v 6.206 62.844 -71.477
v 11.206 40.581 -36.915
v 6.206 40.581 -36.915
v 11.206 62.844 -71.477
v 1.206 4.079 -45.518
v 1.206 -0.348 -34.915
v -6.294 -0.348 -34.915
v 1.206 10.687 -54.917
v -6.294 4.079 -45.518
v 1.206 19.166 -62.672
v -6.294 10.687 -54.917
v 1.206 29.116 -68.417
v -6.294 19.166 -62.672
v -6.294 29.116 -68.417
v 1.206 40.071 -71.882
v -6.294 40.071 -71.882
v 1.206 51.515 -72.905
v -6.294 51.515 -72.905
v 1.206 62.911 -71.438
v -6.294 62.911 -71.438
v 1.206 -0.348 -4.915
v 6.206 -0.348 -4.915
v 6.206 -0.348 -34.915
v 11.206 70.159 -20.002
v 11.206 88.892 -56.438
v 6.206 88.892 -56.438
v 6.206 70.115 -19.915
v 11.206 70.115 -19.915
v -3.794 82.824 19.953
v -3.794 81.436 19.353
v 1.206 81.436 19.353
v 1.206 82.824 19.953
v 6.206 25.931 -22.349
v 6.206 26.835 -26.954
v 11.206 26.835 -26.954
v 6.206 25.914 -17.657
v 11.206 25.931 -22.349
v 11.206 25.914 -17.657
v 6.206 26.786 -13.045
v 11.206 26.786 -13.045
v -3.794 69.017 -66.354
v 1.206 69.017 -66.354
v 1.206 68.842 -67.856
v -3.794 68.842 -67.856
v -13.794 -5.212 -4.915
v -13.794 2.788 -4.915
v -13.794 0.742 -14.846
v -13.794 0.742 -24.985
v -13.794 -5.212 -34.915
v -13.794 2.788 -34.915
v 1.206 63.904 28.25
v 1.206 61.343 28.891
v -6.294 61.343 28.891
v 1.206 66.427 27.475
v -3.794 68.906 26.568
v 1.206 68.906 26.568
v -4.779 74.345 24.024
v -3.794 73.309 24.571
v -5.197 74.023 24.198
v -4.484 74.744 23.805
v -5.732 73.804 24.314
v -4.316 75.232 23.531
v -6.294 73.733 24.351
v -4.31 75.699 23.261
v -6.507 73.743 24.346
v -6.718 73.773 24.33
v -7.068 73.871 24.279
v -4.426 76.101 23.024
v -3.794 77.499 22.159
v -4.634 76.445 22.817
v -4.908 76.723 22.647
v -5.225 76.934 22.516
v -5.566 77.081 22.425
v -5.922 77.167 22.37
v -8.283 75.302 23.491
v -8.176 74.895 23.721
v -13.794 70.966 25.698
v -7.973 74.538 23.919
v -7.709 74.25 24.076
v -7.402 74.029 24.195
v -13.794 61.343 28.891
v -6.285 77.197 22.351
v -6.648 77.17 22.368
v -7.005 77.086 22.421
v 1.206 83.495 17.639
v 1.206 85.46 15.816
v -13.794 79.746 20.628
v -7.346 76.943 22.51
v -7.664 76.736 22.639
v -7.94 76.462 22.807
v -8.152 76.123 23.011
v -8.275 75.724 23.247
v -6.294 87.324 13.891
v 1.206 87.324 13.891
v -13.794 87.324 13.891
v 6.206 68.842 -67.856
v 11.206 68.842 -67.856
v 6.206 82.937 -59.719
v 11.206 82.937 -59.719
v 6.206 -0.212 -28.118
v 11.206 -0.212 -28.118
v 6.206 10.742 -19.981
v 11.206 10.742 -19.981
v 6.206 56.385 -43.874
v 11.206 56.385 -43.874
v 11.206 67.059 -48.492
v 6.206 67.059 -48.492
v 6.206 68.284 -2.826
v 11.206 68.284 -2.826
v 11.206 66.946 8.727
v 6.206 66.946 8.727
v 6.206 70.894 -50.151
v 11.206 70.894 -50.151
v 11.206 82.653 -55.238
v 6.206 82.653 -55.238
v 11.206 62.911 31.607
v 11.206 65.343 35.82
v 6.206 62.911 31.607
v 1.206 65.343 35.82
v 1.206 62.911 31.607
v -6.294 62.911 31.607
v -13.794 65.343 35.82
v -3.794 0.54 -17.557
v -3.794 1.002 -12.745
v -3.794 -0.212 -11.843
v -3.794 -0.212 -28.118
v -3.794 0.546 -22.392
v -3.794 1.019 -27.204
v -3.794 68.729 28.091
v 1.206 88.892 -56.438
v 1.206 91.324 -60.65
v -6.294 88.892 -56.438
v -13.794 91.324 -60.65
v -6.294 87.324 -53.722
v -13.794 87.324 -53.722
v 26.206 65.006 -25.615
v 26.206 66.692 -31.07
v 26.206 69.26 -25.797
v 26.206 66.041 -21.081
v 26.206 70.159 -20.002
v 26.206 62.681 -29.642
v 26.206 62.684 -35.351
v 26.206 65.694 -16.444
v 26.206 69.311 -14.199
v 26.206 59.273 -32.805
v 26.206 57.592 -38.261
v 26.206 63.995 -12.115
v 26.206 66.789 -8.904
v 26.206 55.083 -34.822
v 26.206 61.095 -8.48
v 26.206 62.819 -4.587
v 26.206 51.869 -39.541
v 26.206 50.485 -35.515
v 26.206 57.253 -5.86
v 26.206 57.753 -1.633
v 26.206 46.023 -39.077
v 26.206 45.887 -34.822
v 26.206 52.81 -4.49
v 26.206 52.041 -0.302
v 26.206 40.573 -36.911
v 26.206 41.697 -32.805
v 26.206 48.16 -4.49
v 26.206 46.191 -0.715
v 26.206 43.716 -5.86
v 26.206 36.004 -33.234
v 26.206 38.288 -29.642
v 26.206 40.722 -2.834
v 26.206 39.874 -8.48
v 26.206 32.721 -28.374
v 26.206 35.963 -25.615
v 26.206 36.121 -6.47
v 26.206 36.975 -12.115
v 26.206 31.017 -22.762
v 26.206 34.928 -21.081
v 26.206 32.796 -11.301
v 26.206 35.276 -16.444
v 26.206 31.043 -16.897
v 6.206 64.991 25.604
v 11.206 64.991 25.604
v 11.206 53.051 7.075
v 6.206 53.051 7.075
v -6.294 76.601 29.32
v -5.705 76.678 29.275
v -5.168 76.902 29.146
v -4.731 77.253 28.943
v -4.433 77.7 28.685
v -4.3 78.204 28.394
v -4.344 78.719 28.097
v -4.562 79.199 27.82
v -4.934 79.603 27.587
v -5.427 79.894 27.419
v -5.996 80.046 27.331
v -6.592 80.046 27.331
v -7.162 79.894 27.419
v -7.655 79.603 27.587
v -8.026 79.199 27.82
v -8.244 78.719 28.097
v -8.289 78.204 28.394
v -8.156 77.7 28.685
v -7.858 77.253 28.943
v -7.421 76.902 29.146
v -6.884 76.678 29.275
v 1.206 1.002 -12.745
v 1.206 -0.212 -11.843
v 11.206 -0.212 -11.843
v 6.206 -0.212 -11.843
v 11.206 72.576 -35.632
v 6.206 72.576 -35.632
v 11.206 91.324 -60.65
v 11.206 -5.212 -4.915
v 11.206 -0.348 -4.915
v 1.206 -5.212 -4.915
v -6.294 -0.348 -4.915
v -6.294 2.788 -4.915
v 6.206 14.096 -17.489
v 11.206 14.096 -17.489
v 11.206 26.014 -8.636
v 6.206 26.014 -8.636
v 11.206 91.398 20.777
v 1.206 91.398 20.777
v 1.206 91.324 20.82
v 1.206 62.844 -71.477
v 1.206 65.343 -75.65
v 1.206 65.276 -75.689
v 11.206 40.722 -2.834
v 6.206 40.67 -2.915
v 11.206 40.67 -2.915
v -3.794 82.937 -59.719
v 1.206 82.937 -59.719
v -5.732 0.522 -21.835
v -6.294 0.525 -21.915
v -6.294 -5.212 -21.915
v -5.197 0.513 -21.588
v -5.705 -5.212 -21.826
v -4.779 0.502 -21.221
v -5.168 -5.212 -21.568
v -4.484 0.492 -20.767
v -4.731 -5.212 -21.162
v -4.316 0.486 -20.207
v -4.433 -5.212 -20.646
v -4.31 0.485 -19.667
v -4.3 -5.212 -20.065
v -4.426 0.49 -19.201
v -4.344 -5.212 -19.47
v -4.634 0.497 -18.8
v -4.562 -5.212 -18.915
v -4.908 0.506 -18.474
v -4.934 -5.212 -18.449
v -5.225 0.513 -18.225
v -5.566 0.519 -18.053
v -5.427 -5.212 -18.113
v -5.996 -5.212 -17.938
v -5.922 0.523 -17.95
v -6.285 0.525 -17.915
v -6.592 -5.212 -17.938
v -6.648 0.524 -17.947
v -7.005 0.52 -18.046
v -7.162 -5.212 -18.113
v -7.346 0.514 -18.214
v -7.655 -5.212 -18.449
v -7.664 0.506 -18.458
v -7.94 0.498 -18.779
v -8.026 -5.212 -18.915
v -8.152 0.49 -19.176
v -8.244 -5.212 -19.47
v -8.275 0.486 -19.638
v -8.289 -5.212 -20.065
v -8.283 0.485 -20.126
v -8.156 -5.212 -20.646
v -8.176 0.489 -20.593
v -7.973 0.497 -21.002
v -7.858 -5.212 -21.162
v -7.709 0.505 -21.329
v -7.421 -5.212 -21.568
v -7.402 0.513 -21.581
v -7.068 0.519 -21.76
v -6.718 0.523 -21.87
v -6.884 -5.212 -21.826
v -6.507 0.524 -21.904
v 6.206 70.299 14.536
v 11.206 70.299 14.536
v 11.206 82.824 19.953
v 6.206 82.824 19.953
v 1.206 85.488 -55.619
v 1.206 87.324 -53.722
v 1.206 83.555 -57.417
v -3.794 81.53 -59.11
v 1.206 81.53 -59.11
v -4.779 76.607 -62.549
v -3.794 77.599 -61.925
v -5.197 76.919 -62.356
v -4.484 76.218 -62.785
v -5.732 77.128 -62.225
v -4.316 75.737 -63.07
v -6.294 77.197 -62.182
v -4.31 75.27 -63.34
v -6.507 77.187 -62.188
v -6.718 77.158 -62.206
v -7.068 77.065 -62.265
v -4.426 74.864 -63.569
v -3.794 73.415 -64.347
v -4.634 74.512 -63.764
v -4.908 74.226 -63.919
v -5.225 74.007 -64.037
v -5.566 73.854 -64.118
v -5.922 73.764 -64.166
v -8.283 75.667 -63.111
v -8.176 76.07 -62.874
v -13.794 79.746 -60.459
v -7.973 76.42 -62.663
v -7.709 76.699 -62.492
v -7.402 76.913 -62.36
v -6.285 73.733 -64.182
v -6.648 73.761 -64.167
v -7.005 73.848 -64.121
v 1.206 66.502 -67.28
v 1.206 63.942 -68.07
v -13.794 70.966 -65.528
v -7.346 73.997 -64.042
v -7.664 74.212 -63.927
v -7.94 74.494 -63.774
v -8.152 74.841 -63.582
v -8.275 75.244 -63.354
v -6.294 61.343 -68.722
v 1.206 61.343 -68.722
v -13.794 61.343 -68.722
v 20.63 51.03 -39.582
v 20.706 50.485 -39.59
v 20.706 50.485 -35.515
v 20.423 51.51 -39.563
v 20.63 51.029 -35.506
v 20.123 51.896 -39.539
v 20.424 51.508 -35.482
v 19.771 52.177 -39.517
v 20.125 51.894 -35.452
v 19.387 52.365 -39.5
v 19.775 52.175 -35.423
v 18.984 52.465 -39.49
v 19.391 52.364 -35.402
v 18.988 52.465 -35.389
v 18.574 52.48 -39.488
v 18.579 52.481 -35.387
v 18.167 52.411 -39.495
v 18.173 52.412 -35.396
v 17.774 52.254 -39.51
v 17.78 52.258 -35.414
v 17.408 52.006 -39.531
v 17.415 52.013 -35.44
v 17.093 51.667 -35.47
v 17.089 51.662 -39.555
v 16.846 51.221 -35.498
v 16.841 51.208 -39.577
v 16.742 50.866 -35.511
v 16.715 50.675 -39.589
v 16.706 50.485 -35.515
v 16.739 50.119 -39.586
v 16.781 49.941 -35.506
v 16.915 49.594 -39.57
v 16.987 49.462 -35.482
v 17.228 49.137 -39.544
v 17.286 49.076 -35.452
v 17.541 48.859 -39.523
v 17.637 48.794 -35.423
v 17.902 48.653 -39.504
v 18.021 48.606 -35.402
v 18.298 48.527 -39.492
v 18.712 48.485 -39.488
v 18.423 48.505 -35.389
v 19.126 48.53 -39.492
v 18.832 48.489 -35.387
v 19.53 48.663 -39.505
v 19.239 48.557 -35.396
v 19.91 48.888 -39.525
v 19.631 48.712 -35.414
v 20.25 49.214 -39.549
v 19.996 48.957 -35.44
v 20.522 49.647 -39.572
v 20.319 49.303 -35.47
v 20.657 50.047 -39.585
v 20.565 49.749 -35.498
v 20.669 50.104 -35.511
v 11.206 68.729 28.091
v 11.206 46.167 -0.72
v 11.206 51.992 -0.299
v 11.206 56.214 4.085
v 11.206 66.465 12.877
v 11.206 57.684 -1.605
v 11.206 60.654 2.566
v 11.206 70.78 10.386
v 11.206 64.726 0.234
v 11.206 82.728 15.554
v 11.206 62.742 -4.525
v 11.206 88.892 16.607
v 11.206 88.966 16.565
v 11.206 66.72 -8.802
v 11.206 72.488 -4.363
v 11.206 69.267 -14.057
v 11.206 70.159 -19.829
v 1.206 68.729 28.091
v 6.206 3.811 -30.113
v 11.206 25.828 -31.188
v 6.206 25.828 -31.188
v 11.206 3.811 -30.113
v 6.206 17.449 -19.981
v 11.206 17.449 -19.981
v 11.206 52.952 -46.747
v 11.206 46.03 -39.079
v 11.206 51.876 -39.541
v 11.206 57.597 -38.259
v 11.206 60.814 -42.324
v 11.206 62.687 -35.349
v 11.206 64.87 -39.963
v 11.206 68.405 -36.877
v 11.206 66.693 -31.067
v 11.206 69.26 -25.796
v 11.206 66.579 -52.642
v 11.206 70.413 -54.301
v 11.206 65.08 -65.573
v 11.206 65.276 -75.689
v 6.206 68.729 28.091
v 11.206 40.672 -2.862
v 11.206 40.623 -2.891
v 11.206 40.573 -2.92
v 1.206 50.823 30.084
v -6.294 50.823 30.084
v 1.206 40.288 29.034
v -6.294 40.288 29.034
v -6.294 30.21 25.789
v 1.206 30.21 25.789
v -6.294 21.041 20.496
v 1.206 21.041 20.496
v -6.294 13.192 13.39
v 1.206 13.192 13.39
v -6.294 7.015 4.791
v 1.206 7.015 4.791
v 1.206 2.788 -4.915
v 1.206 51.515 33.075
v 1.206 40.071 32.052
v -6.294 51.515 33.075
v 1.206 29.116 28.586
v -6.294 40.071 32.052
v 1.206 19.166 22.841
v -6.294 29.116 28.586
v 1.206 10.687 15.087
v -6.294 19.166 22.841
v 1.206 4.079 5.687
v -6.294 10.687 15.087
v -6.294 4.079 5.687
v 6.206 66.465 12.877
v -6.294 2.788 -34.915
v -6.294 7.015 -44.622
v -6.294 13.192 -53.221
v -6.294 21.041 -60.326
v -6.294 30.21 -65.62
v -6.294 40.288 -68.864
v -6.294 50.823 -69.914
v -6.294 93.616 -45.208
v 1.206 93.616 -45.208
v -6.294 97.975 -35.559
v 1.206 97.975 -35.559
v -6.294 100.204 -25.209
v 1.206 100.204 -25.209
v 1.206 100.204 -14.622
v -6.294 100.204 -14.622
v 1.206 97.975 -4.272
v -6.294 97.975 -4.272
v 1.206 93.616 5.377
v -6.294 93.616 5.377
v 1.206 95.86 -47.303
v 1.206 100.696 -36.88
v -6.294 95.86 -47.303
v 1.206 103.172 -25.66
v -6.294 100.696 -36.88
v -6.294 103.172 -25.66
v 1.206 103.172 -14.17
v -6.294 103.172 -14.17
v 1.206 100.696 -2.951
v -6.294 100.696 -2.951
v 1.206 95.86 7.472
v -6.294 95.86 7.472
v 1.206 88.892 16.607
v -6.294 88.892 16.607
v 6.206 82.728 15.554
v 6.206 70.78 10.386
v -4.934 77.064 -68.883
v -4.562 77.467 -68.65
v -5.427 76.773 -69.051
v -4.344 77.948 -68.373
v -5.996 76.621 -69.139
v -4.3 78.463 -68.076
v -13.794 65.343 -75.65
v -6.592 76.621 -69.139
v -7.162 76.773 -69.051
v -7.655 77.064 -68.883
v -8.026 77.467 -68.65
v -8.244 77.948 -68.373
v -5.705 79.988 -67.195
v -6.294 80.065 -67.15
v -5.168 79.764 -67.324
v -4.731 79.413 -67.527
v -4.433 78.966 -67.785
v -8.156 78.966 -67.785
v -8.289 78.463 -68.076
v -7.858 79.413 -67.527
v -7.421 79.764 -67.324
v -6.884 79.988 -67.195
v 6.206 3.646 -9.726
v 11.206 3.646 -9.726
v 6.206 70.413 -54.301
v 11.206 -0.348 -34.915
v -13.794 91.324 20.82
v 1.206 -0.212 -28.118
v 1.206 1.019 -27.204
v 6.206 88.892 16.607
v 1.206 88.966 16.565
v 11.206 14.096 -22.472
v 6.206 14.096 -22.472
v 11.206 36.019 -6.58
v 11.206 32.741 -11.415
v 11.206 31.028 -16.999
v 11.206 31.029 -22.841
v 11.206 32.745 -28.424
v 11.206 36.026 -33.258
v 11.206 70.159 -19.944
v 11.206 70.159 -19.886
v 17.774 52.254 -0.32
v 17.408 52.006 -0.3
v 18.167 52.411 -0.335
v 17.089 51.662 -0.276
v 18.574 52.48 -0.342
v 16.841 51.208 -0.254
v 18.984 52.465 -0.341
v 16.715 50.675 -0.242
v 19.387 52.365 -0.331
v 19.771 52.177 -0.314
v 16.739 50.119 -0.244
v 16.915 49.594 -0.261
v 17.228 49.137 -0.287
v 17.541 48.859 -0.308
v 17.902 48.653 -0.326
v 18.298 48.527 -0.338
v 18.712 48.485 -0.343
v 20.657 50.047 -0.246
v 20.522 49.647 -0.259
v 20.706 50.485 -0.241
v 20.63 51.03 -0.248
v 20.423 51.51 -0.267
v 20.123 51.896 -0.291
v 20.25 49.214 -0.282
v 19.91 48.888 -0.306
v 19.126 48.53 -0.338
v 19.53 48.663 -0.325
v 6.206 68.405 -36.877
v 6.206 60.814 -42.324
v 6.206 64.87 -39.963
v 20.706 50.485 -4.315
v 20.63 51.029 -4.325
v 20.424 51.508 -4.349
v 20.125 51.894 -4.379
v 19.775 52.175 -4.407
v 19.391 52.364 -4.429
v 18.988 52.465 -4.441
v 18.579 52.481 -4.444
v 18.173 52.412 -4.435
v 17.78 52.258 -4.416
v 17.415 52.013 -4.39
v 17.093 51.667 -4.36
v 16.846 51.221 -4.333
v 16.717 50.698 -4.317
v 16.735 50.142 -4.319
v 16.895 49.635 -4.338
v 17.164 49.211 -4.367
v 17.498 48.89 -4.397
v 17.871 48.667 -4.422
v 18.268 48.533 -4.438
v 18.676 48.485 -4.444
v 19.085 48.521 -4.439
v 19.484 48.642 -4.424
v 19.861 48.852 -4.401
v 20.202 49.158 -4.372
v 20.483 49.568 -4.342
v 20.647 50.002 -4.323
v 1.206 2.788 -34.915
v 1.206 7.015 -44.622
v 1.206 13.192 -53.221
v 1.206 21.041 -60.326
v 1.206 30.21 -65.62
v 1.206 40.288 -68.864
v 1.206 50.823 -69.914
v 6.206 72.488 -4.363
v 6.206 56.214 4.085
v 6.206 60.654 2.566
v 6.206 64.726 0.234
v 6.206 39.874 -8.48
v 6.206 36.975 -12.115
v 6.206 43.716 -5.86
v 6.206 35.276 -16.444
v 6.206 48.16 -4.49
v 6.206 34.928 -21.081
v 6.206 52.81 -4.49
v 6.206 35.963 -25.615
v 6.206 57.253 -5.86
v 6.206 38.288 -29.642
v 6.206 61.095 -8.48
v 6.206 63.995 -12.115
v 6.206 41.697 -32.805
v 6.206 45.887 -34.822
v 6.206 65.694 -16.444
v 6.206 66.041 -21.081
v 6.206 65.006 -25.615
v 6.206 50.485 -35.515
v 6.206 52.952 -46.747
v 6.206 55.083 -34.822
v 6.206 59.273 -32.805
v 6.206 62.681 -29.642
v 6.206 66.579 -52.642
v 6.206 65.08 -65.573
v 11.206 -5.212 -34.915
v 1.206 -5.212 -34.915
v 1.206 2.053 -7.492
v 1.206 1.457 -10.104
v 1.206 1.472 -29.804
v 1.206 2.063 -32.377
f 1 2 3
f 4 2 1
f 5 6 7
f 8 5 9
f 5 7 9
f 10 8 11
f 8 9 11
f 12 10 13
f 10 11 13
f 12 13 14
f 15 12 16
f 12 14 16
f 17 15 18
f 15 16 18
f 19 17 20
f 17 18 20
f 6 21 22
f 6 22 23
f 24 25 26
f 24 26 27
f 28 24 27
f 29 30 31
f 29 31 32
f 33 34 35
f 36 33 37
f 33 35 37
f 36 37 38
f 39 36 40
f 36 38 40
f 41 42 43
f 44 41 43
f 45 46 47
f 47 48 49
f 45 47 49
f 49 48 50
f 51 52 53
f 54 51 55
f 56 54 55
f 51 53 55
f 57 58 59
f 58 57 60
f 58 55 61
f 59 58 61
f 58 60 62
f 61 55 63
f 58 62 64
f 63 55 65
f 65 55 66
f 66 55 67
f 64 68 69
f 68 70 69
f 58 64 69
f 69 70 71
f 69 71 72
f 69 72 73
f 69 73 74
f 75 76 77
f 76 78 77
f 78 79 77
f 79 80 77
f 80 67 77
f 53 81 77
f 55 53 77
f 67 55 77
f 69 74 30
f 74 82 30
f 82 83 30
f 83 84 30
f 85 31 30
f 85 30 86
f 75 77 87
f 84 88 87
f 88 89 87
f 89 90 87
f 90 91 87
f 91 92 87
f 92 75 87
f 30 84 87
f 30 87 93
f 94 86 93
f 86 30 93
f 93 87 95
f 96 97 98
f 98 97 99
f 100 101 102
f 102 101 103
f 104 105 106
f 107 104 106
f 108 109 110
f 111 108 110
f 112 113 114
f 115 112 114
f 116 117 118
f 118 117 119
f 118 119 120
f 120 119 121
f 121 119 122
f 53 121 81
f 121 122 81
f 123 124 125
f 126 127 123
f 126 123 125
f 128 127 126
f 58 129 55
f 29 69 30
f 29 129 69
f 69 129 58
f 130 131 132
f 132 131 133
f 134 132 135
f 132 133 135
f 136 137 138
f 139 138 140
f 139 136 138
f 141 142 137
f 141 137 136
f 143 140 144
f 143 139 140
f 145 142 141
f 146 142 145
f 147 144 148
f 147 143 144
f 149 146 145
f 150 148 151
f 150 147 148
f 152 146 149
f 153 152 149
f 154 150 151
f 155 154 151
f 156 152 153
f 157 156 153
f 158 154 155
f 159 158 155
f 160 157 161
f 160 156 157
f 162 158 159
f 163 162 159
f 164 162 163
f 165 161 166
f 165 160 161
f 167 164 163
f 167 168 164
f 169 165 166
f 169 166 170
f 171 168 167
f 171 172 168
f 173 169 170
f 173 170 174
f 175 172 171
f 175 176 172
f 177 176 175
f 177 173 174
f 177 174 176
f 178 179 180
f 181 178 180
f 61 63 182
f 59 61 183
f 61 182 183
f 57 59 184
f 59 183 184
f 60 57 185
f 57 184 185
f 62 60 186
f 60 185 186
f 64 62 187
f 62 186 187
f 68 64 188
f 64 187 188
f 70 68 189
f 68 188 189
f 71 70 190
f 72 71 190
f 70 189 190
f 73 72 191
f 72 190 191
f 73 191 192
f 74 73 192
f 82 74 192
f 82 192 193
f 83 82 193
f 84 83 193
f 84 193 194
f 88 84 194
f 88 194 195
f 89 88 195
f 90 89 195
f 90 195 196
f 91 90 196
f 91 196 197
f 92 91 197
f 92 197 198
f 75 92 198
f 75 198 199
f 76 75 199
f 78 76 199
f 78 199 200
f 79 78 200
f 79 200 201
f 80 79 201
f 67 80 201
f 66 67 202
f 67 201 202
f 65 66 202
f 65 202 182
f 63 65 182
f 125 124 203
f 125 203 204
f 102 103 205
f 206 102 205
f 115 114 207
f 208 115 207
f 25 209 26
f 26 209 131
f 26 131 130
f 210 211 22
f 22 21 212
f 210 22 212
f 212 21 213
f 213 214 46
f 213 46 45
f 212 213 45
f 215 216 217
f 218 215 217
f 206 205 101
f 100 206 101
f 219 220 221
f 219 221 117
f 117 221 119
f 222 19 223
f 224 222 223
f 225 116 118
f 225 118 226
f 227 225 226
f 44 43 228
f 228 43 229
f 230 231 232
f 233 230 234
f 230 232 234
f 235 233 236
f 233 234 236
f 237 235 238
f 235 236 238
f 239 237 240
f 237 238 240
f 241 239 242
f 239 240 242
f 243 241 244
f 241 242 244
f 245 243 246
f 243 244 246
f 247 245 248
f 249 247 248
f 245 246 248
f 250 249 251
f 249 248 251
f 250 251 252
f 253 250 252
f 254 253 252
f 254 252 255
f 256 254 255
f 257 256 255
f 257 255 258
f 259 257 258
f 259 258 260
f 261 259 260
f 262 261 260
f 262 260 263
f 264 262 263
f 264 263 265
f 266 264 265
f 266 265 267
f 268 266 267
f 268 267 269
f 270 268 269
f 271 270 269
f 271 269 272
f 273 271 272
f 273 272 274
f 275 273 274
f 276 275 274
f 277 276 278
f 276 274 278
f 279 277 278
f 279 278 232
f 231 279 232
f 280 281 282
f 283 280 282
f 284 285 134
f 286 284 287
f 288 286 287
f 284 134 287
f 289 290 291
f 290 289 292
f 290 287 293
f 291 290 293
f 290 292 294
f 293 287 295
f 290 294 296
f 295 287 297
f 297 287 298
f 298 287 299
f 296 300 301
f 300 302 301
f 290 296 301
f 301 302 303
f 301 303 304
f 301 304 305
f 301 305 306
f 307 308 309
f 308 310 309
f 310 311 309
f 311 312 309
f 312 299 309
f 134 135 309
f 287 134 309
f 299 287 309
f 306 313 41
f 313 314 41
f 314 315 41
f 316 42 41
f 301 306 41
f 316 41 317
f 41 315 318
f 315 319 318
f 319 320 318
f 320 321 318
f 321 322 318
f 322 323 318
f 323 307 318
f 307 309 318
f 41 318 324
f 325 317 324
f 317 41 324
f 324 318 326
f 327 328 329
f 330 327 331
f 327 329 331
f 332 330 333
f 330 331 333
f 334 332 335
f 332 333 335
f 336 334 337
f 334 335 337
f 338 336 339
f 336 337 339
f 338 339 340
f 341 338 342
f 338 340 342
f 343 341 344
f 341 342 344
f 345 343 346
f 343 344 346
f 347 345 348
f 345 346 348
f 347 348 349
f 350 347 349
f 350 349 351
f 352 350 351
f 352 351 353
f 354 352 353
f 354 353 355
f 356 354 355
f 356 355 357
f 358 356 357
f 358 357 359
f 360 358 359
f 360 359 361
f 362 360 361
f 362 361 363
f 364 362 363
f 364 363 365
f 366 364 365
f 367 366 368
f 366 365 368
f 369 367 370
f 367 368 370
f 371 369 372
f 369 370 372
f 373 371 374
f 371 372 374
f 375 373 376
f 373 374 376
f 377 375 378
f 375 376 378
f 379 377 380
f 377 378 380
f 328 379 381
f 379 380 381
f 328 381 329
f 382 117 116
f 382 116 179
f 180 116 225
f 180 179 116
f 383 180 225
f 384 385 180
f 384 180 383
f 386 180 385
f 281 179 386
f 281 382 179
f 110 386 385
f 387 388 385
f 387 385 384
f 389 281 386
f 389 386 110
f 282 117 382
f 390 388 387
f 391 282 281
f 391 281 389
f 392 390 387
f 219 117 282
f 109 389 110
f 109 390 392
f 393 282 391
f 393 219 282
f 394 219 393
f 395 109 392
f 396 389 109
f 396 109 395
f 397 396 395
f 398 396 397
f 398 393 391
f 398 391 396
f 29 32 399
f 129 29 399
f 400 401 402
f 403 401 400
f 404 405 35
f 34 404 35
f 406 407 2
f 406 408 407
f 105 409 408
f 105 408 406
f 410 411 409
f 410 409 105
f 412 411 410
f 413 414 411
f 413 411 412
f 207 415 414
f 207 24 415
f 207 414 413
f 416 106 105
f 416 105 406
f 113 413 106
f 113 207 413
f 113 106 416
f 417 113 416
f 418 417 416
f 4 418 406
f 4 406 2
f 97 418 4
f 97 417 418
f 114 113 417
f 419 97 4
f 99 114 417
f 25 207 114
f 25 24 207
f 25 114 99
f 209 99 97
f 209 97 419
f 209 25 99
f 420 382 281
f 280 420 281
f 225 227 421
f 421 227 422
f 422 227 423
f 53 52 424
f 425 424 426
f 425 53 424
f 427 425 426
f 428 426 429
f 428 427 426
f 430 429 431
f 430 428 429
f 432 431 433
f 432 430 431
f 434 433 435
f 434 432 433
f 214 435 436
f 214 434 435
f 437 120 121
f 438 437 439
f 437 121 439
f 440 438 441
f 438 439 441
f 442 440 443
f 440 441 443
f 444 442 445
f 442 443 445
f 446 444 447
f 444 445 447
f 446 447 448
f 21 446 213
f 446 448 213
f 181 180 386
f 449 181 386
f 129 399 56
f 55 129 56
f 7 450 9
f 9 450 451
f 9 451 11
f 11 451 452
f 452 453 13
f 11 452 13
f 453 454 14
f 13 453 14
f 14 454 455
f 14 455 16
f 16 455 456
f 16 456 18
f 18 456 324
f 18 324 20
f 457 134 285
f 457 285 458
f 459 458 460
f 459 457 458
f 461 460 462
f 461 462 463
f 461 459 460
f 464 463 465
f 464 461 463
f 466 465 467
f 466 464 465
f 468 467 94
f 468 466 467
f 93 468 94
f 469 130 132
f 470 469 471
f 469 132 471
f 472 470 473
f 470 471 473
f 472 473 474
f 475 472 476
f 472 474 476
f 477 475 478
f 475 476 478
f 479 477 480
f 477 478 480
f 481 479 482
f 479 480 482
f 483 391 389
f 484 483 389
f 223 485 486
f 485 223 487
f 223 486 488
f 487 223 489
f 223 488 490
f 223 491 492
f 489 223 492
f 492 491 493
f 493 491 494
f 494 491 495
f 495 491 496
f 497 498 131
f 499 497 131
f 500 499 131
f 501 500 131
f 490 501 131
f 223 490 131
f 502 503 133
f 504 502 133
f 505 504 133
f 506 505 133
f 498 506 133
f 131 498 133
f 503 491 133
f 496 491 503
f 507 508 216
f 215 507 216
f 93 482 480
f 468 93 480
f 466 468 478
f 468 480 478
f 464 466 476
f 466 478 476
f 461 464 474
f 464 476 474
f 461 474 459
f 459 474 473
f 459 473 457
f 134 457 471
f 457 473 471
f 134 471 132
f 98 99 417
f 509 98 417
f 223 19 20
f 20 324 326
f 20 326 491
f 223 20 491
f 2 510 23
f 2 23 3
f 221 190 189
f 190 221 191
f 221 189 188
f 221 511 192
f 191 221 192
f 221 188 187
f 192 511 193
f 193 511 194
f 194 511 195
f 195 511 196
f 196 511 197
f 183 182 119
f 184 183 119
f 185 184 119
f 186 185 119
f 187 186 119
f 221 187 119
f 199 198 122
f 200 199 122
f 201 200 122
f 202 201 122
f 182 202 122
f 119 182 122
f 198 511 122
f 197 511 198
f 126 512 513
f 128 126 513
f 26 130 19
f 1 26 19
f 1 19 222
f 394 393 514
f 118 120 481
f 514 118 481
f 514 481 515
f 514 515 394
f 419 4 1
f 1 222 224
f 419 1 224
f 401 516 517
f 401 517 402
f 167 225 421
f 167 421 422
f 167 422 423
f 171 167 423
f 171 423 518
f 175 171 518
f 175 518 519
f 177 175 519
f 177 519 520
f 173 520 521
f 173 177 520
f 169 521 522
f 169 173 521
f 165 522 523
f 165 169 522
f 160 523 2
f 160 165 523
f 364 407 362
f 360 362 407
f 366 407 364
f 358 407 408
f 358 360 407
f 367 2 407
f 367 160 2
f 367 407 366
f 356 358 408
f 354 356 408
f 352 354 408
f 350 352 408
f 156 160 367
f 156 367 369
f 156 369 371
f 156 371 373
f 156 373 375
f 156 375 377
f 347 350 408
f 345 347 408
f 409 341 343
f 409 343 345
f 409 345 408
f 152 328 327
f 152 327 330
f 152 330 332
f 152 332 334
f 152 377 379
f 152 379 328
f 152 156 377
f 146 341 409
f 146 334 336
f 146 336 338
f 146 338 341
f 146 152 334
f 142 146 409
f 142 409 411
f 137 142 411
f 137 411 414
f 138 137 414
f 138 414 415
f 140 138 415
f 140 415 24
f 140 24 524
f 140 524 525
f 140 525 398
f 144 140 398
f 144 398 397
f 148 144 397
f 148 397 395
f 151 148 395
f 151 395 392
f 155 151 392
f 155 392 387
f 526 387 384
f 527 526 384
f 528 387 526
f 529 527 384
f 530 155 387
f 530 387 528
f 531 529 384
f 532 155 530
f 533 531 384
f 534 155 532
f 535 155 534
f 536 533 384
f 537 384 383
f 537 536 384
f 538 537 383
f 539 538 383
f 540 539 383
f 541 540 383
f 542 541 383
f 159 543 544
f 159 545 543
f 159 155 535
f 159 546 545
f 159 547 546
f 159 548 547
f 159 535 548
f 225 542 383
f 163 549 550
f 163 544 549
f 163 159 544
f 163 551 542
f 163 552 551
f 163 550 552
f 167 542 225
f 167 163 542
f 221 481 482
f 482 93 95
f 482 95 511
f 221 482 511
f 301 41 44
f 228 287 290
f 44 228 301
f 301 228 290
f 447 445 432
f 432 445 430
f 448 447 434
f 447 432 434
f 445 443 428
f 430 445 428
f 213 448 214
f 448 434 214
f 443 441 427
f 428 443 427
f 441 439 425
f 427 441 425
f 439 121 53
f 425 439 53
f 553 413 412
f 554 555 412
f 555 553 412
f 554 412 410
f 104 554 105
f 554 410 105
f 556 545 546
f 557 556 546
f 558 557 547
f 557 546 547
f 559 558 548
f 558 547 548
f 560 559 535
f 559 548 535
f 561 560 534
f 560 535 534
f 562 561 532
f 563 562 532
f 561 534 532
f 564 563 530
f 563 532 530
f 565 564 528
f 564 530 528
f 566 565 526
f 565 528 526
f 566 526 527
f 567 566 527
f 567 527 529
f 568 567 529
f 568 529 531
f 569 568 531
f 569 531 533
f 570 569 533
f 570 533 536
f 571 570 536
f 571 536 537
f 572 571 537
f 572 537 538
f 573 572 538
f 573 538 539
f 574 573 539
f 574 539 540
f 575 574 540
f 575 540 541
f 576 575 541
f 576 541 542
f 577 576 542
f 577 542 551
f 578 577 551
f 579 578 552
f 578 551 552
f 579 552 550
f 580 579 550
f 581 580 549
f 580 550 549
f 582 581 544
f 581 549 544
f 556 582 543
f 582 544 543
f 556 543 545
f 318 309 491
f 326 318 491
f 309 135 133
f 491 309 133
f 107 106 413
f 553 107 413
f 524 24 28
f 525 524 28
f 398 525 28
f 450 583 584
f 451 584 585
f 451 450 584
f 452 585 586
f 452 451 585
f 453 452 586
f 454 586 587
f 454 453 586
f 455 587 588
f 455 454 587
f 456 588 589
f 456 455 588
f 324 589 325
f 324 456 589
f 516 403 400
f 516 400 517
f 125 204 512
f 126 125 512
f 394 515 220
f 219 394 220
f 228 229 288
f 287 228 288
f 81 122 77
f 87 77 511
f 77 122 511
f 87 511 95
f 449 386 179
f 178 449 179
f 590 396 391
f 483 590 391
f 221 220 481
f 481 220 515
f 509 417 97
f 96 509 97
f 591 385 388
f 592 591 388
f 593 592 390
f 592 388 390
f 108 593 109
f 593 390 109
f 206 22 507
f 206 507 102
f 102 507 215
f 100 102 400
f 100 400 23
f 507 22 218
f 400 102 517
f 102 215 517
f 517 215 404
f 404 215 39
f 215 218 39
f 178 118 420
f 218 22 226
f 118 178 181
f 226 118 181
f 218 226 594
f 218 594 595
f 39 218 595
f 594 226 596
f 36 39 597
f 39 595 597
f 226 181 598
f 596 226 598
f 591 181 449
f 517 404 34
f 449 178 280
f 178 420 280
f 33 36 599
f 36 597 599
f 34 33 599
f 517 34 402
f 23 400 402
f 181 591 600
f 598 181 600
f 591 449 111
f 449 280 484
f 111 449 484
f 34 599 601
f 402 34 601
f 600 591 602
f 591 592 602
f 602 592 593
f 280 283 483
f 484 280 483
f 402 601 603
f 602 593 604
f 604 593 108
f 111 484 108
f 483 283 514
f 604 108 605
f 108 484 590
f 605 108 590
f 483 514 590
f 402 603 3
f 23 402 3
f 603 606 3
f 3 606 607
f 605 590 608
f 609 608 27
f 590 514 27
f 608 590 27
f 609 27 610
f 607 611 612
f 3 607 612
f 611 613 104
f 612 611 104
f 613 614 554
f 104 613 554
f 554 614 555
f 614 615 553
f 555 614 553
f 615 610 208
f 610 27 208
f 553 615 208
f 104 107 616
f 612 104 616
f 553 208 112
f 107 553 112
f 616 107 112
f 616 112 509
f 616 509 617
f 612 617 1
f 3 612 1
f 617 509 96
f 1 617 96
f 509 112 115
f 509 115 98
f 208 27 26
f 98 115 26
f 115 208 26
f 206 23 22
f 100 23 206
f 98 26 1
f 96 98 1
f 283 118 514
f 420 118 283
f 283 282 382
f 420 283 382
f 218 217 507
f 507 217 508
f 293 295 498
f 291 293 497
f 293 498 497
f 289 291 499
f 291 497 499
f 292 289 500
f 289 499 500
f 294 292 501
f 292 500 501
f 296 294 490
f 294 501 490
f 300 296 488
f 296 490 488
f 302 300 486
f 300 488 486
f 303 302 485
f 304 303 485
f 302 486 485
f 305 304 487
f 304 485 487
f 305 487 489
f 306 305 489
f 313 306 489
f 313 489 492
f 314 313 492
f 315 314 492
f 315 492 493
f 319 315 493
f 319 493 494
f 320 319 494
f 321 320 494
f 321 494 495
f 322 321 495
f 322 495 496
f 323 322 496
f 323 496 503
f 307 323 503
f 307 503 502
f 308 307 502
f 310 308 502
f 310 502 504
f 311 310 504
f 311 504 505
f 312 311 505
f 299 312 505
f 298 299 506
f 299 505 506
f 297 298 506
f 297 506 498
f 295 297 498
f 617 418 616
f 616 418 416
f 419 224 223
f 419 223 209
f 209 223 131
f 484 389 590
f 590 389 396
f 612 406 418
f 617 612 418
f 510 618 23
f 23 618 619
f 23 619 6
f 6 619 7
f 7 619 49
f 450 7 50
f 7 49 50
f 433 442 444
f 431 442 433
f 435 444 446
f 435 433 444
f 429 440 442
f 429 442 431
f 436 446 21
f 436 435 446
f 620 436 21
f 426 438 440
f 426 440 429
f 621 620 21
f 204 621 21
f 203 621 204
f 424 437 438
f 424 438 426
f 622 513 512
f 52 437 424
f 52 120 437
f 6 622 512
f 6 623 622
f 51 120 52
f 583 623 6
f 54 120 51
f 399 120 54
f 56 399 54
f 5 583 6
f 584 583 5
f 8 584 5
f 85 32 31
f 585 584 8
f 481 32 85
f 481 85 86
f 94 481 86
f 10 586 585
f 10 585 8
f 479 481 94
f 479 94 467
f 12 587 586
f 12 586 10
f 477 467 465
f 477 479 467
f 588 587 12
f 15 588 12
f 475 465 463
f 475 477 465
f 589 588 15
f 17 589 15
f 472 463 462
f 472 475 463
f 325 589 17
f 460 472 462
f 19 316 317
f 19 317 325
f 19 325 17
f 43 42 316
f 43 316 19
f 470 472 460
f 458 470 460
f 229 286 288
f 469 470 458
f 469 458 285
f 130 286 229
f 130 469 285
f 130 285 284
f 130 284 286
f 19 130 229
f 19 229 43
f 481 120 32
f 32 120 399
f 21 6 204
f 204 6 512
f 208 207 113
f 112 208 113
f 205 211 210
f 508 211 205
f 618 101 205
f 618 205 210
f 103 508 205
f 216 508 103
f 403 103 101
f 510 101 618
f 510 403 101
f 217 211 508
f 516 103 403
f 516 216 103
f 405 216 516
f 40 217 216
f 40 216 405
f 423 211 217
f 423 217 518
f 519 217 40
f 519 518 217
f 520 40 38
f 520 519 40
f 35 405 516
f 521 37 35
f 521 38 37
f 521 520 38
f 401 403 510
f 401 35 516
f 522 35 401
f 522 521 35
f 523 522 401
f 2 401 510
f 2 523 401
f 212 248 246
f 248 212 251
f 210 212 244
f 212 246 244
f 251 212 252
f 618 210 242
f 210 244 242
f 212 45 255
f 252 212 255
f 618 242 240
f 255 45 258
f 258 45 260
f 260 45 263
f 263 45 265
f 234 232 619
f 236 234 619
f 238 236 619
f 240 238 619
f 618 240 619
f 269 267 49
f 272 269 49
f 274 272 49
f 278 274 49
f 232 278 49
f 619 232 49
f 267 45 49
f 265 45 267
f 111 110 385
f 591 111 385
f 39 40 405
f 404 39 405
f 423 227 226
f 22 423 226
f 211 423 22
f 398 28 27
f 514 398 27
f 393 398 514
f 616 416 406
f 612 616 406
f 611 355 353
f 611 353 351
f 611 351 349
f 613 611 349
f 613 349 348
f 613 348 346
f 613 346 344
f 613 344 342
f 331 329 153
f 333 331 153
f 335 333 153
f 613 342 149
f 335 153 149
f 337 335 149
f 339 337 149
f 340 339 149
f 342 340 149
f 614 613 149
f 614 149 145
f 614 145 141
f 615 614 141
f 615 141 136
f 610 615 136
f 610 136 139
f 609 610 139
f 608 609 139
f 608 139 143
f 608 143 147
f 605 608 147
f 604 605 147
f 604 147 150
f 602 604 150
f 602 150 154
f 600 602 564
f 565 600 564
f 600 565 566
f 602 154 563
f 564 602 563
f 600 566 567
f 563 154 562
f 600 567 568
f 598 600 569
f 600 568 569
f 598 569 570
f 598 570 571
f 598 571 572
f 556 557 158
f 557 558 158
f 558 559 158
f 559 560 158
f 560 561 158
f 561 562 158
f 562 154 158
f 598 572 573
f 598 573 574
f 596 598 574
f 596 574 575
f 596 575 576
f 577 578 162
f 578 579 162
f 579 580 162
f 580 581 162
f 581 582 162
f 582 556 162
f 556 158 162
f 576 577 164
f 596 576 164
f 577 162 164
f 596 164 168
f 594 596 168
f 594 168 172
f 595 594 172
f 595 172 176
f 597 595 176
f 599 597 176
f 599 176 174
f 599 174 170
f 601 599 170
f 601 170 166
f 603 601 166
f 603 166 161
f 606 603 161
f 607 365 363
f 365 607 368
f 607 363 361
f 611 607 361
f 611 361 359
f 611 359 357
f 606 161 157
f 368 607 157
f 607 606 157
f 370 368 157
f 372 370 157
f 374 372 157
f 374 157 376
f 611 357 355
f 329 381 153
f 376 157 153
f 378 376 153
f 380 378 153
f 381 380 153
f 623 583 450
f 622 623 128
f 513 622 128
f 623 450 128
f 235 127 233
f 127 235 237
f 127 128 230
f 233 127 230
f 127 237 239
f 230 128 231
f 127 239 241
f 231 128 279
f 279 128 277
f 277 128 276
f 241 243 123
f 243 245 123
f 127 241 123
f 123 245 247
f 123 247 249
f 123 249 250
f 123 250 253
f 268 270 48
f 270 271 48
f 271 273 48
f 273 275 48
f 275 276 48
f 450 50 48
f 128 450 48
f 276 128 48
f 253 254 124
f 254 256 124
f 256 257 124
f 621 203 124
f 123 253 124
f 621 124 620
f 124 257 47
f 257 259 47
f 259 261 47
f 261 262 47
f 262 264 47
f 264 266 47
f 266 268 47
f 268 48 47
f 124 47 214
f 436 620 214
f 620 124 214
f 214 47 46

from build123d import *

# Parameters (mm, degrees)
EXTRUDE_START       = -15
EXTRUDE_1_DEPTH     = 15
EXTRUDE_START_2     = -7.5
SKETCH_2_R          = 53
SKETCH_2_R_2        = 50
EXTRUDE_2_DEPTH     = 7.5
SKETCH_3_R          = 2
CUT_EXTRUDE_1_DEPTH = 10
SKETCH_4_R          = 2
CUT_EXTRUDE_2_DEPTH = 10
SKETCH_5_R          = 2
CUT_EXTRUDE_3_DEPTH = 10
SKETCH_6_W          = 30
SKETCH_6_H          = 4.863899963
EXTRUDE_3_DEPTH     = 10
SKETCH_7_R          = 15.6
EXTRUDE_4_DEPTH     = 5
EXTRUDE_START_3     = 15
SKETCH_8_R          = 19.674554727
SKETCH_8_R_2        = 15.6
EXTRUDE_5_DEPTH     = 15
SKETCH_9_R          = 2
CUT_EXTRUDE_4_DEPTH = 131.86111959
CUT_EXTRUDE_5_DEPTH = 15


# Read off the part's stored shape, not the designer's step: 填料-伸長1
with BuildPart() as part:
    # 填料-伸長1 outline → 填料-伸長1 (new body)
    with BuildSketch(Plane(origin=(1.20571551, 0, 0), x_dir=(0, 0, -1), z_dir=(1, 0, 0)).offset(EXTRUDE_START)):
        with BuildLine():
            ThreePointArc((-28.891489898, 61.342870268), (-23.385980983, 75.484771289), (-13.891489898, 87.323632381))
            Line((-13.891489898, 87.323632381), (-20.819693129, 91.323632381))
            Line((-20.819693129, 91.323632381), (-35.819693129, 65.342870268))
            Line((-35.819693129, 65.342870268), (-28.891489898, 61.342870268))
        make_face()
        with BuildLine():
            ThreePointArc((34.915289206, 2.787811218), (19.915289206, 0.484771289), (4.915289206, 2.787811218))
            Line((4.915289206, 2.787811218), (4.915289206, -5.212188782))
            Line((4.915289206, -5.212188782), (34.915289206, -5.212188782))
            Line((34.915289206, -5.212188782), (34.915289206, 2.787811218))
        make_face()
        with BuildLine():
            ThreePointArc((53.722068311, 87.323632381), (63.216559396, 75.484771289), (68.722068311, 61.342870268))
            Line((68.722068311, 61.342870268), (75.650271541, 65.342870268))
            Line((75.650271541, 65.342870268), (60.650271541, 91.323632381))
            Line((60.650271541, 91.323632381), (53.722068311, 87.323632381))
        make_face()
    extrude(amount=EXTRUDE_1_DEPTH)

    # 草圖2 → 填料-伸長2 (add)
    with BuildSketch(Plane(origin=(1.20571551, 0, 0), x_dir=(0, 0, -1), z_dir=(1, 0, 0)).offset(EXTRUDE_START_2)):
        with Locations((19.915289206, 50.484771289)):
            Circle(SKETCH_2_R)
        with Locations((19.915289206, 50.484771289)):
            Circle(SKETCH_2_R_2, mode=Mode.SUBTRACT)
    extrude(amount=EXTRUDE_2_DEPTH)

    # 草圖3 → 除料-伸長1 (cut)
    with BuildSketch(Plane(origin=(0, 31.846099669, 55.15906265), x_dir=(1, 0, 0), z_dir=(0, 0.5000000000000088, 0.8660254037844337))):
        with Locations(Location((-6.29428449, 53.678739044, 0), (0, 0, 270))):
            Circle(SKETCH_3_R)
    extrude(amount=-CUT_EXTRUDE_1_DEPTH, mode=Mode.SUBTRACT)

    # 草圖4 → 除料-伸長2 (cut)
    with BuildSketch(Plane.XZ.offset(5.212188782)):
        with Locations(Location((-6.29428449, -19.915289206, 0), (0, 0, 270))):
            Circle(SKETCH_4_R)
    extrude(amount=-CUT_EXTRUDE_2_DEPTH, mode=Mode.SUBTRACT)

    # 草圖5 → 除料-伸長3 (cut)
    with BuildSketch(Plane(origin=(0, 49.093246046, -85.03199646), x_dir=(-1, 0, 0), z_dir=(0, 0.5000000000000044, -0.8660254037844362))):
        with Locations(Location((6.29428449, 33.763449837, 0), (0, 0, 90))):
            Circle(SKETCH_5_R)
    extrude(amount=-CUT_EXTRUDE_3_DEPTH, mode=Mode.SUBTRACT)

    # 草圖6 → 填料-伸長3 (add)
    with BuildSketch(Plane(origin=(1.20571551, 0, 0), x_dir=(0, 0, -1), z_dir=(1, 0, 0))):
        Polygon((-35.819693129, 65.342870268), (-31.6074322, 62.910920287), (-16.564749505, 88.965610996), (-20.777010434, 91.397560977), align=None)
        with Locations((19.915289206, -2.780238801)):
            Rectangle(SKETCH_6_W, SKETCH_6_H)
        Polygon((60.650271541, 91.323632381), (56.438010612, 88.8916824), (71.476544096, 62.844178335), (75.688805025, 65.276128316), align=None)
    extrude(amount=EXTRUDE_3_DEPTH)

    # 草圖7 → 填料-伸長4 (add)
    with BuildSketch(Plane(origin=(11.20571551, 0, 0), x_dir=(0, 0, -1), z_dir=(1, 0, 0))):
        Polygon((4.915289206, -0.348288819), (34.915289206, -0.348288819), (36.915289206, 40.580827444), (71.476544096, 62.844178335), (56.438010612, 88.8916824), (19.915289206, 70.114680442), (-16.6074322, 88.8916824), (-31.6074322, 62.910920287), (2.915289206, 40.669816713), align=None)
        with Locations((19.915289206, 50.484771289)):
            Circle(SKETCH_7_R, mode=Mode.SUBTRACT)
    extrude(amount=-EXTRUDE_4_DEPTH)

    # 草圖8 → 填料-伸長5 (add)
    with BuildSketch(Plane(origin=(11.20571551, 0, 0), x_dir=(0, 0, -1), z_dir=(1, 0, 0)).offset(EXTRUDE_START_3)):
        with Locations(Location((19.915289206, 50.484771289, 0), (0, 0, 209.748184736))):
            Circle(SKETCH_8_R)
        with Locations((19.915289206, 50.484771289)):
            Circle(SKETCH_8_R_2, mode=Mode.SUBTRACT)
    extrude(amount=-EXTRUDE_5_DEPTH)

    # 草圖9 → 除料-伸長4 (cut, through all)
    with BuildSketch(Plane.XY):
        with Locations((18.70571551, 50.484771289)):
            Circle(SKETCH_9_R)
    extrude(amount=-CUT_EXTRUDE_4_DEPTH, mode=Mode.SUBTRACT)

    # 草圖10 → 除料-伸長5 (cut)
    with BuildSketch(Plane(origin=(11.20571551, 0, 0), x_dir=(0, 0, -1), z_dir=(1, 0, 0))):
        Polygon((17.489472579, 14.095645642), (8.635822473, 26.014186948), (9.726460643, 3.646231166), align=None)
        Polygon((4.362874888, 72.488368192), (-15.553662135, 82.727825721), (-10.385709712, 70.780152937), align=None)
        with BuildLine():
            Line((19.981027019, 17.44940643), (26.954063356, 26.835473003))
            ThreePointArc((26.954063356, 26.835473003), (20.003346412, 25.81037369), (13.045489926, 26.785836528))
            Line((13.045489926, 26.785836528), (19.981027019, 17.44940643))
        make_face()
        Polygon((-19.953437634, 82.824030911), (-28.090922206, 68.729494185), (-14.535949667, 70.299462525), align=None)
        Polygon((22.472437105, 14.095538404), (31.188411686, 25.827689753), (30.112548712, 3.810629391), align=None)
        Polygon((-25.60433313, 64.990756457), (-7.074931027, 53.05050161), (-12.877284846, 66.464832691), align=None)
        with BuildLine():
            Line((-8.727044891, 66.945523102), (-4.084990966, 56.213663207))
            ThreePointArc((-4.084990966, 56.213663207), (-1.49739454, 62.745710311), (2.826309301, 68.283659365))
            Line((2.826309301, 68.283659365), (-8.727044891, 66.945523102))
        make_face()
        Polygon((11.843032254, -0.212188782), (28.1180014, -0.212188782), (19.980882665, 10.741777615), align=None)
        Polygon((46.747170258, 52.951758728), (65.573069111, 65.080256981), (52.642104752, 66.578515289), align=None)
        Polygon((67.856272998, 68.842471738), (59.718788426, 82.937008464), (54.300934622, 70.413073728), align=None)
        Polygon((55.237652037, 82.652928019), (35.632386961, 72.576122504), (50.15071536, 70.893942773), align=None)
        with BuildLine():
            Line((48.491885491, 67.059384335), (36.876795229, 68.405177657))
            ThreePointArc((36.876795229, 68.405177657), (41.239915747, 62.898229866), (43.874068392, 56.384817974))
            Line((43.874068392, 56.384817974), (48.491885491, 67.059384335))
        make_face()
    extrude(amount=-CUT_EXTRUDE_5_DEPTH, mode=Mode.SUBTRACT)


solid = part.part
